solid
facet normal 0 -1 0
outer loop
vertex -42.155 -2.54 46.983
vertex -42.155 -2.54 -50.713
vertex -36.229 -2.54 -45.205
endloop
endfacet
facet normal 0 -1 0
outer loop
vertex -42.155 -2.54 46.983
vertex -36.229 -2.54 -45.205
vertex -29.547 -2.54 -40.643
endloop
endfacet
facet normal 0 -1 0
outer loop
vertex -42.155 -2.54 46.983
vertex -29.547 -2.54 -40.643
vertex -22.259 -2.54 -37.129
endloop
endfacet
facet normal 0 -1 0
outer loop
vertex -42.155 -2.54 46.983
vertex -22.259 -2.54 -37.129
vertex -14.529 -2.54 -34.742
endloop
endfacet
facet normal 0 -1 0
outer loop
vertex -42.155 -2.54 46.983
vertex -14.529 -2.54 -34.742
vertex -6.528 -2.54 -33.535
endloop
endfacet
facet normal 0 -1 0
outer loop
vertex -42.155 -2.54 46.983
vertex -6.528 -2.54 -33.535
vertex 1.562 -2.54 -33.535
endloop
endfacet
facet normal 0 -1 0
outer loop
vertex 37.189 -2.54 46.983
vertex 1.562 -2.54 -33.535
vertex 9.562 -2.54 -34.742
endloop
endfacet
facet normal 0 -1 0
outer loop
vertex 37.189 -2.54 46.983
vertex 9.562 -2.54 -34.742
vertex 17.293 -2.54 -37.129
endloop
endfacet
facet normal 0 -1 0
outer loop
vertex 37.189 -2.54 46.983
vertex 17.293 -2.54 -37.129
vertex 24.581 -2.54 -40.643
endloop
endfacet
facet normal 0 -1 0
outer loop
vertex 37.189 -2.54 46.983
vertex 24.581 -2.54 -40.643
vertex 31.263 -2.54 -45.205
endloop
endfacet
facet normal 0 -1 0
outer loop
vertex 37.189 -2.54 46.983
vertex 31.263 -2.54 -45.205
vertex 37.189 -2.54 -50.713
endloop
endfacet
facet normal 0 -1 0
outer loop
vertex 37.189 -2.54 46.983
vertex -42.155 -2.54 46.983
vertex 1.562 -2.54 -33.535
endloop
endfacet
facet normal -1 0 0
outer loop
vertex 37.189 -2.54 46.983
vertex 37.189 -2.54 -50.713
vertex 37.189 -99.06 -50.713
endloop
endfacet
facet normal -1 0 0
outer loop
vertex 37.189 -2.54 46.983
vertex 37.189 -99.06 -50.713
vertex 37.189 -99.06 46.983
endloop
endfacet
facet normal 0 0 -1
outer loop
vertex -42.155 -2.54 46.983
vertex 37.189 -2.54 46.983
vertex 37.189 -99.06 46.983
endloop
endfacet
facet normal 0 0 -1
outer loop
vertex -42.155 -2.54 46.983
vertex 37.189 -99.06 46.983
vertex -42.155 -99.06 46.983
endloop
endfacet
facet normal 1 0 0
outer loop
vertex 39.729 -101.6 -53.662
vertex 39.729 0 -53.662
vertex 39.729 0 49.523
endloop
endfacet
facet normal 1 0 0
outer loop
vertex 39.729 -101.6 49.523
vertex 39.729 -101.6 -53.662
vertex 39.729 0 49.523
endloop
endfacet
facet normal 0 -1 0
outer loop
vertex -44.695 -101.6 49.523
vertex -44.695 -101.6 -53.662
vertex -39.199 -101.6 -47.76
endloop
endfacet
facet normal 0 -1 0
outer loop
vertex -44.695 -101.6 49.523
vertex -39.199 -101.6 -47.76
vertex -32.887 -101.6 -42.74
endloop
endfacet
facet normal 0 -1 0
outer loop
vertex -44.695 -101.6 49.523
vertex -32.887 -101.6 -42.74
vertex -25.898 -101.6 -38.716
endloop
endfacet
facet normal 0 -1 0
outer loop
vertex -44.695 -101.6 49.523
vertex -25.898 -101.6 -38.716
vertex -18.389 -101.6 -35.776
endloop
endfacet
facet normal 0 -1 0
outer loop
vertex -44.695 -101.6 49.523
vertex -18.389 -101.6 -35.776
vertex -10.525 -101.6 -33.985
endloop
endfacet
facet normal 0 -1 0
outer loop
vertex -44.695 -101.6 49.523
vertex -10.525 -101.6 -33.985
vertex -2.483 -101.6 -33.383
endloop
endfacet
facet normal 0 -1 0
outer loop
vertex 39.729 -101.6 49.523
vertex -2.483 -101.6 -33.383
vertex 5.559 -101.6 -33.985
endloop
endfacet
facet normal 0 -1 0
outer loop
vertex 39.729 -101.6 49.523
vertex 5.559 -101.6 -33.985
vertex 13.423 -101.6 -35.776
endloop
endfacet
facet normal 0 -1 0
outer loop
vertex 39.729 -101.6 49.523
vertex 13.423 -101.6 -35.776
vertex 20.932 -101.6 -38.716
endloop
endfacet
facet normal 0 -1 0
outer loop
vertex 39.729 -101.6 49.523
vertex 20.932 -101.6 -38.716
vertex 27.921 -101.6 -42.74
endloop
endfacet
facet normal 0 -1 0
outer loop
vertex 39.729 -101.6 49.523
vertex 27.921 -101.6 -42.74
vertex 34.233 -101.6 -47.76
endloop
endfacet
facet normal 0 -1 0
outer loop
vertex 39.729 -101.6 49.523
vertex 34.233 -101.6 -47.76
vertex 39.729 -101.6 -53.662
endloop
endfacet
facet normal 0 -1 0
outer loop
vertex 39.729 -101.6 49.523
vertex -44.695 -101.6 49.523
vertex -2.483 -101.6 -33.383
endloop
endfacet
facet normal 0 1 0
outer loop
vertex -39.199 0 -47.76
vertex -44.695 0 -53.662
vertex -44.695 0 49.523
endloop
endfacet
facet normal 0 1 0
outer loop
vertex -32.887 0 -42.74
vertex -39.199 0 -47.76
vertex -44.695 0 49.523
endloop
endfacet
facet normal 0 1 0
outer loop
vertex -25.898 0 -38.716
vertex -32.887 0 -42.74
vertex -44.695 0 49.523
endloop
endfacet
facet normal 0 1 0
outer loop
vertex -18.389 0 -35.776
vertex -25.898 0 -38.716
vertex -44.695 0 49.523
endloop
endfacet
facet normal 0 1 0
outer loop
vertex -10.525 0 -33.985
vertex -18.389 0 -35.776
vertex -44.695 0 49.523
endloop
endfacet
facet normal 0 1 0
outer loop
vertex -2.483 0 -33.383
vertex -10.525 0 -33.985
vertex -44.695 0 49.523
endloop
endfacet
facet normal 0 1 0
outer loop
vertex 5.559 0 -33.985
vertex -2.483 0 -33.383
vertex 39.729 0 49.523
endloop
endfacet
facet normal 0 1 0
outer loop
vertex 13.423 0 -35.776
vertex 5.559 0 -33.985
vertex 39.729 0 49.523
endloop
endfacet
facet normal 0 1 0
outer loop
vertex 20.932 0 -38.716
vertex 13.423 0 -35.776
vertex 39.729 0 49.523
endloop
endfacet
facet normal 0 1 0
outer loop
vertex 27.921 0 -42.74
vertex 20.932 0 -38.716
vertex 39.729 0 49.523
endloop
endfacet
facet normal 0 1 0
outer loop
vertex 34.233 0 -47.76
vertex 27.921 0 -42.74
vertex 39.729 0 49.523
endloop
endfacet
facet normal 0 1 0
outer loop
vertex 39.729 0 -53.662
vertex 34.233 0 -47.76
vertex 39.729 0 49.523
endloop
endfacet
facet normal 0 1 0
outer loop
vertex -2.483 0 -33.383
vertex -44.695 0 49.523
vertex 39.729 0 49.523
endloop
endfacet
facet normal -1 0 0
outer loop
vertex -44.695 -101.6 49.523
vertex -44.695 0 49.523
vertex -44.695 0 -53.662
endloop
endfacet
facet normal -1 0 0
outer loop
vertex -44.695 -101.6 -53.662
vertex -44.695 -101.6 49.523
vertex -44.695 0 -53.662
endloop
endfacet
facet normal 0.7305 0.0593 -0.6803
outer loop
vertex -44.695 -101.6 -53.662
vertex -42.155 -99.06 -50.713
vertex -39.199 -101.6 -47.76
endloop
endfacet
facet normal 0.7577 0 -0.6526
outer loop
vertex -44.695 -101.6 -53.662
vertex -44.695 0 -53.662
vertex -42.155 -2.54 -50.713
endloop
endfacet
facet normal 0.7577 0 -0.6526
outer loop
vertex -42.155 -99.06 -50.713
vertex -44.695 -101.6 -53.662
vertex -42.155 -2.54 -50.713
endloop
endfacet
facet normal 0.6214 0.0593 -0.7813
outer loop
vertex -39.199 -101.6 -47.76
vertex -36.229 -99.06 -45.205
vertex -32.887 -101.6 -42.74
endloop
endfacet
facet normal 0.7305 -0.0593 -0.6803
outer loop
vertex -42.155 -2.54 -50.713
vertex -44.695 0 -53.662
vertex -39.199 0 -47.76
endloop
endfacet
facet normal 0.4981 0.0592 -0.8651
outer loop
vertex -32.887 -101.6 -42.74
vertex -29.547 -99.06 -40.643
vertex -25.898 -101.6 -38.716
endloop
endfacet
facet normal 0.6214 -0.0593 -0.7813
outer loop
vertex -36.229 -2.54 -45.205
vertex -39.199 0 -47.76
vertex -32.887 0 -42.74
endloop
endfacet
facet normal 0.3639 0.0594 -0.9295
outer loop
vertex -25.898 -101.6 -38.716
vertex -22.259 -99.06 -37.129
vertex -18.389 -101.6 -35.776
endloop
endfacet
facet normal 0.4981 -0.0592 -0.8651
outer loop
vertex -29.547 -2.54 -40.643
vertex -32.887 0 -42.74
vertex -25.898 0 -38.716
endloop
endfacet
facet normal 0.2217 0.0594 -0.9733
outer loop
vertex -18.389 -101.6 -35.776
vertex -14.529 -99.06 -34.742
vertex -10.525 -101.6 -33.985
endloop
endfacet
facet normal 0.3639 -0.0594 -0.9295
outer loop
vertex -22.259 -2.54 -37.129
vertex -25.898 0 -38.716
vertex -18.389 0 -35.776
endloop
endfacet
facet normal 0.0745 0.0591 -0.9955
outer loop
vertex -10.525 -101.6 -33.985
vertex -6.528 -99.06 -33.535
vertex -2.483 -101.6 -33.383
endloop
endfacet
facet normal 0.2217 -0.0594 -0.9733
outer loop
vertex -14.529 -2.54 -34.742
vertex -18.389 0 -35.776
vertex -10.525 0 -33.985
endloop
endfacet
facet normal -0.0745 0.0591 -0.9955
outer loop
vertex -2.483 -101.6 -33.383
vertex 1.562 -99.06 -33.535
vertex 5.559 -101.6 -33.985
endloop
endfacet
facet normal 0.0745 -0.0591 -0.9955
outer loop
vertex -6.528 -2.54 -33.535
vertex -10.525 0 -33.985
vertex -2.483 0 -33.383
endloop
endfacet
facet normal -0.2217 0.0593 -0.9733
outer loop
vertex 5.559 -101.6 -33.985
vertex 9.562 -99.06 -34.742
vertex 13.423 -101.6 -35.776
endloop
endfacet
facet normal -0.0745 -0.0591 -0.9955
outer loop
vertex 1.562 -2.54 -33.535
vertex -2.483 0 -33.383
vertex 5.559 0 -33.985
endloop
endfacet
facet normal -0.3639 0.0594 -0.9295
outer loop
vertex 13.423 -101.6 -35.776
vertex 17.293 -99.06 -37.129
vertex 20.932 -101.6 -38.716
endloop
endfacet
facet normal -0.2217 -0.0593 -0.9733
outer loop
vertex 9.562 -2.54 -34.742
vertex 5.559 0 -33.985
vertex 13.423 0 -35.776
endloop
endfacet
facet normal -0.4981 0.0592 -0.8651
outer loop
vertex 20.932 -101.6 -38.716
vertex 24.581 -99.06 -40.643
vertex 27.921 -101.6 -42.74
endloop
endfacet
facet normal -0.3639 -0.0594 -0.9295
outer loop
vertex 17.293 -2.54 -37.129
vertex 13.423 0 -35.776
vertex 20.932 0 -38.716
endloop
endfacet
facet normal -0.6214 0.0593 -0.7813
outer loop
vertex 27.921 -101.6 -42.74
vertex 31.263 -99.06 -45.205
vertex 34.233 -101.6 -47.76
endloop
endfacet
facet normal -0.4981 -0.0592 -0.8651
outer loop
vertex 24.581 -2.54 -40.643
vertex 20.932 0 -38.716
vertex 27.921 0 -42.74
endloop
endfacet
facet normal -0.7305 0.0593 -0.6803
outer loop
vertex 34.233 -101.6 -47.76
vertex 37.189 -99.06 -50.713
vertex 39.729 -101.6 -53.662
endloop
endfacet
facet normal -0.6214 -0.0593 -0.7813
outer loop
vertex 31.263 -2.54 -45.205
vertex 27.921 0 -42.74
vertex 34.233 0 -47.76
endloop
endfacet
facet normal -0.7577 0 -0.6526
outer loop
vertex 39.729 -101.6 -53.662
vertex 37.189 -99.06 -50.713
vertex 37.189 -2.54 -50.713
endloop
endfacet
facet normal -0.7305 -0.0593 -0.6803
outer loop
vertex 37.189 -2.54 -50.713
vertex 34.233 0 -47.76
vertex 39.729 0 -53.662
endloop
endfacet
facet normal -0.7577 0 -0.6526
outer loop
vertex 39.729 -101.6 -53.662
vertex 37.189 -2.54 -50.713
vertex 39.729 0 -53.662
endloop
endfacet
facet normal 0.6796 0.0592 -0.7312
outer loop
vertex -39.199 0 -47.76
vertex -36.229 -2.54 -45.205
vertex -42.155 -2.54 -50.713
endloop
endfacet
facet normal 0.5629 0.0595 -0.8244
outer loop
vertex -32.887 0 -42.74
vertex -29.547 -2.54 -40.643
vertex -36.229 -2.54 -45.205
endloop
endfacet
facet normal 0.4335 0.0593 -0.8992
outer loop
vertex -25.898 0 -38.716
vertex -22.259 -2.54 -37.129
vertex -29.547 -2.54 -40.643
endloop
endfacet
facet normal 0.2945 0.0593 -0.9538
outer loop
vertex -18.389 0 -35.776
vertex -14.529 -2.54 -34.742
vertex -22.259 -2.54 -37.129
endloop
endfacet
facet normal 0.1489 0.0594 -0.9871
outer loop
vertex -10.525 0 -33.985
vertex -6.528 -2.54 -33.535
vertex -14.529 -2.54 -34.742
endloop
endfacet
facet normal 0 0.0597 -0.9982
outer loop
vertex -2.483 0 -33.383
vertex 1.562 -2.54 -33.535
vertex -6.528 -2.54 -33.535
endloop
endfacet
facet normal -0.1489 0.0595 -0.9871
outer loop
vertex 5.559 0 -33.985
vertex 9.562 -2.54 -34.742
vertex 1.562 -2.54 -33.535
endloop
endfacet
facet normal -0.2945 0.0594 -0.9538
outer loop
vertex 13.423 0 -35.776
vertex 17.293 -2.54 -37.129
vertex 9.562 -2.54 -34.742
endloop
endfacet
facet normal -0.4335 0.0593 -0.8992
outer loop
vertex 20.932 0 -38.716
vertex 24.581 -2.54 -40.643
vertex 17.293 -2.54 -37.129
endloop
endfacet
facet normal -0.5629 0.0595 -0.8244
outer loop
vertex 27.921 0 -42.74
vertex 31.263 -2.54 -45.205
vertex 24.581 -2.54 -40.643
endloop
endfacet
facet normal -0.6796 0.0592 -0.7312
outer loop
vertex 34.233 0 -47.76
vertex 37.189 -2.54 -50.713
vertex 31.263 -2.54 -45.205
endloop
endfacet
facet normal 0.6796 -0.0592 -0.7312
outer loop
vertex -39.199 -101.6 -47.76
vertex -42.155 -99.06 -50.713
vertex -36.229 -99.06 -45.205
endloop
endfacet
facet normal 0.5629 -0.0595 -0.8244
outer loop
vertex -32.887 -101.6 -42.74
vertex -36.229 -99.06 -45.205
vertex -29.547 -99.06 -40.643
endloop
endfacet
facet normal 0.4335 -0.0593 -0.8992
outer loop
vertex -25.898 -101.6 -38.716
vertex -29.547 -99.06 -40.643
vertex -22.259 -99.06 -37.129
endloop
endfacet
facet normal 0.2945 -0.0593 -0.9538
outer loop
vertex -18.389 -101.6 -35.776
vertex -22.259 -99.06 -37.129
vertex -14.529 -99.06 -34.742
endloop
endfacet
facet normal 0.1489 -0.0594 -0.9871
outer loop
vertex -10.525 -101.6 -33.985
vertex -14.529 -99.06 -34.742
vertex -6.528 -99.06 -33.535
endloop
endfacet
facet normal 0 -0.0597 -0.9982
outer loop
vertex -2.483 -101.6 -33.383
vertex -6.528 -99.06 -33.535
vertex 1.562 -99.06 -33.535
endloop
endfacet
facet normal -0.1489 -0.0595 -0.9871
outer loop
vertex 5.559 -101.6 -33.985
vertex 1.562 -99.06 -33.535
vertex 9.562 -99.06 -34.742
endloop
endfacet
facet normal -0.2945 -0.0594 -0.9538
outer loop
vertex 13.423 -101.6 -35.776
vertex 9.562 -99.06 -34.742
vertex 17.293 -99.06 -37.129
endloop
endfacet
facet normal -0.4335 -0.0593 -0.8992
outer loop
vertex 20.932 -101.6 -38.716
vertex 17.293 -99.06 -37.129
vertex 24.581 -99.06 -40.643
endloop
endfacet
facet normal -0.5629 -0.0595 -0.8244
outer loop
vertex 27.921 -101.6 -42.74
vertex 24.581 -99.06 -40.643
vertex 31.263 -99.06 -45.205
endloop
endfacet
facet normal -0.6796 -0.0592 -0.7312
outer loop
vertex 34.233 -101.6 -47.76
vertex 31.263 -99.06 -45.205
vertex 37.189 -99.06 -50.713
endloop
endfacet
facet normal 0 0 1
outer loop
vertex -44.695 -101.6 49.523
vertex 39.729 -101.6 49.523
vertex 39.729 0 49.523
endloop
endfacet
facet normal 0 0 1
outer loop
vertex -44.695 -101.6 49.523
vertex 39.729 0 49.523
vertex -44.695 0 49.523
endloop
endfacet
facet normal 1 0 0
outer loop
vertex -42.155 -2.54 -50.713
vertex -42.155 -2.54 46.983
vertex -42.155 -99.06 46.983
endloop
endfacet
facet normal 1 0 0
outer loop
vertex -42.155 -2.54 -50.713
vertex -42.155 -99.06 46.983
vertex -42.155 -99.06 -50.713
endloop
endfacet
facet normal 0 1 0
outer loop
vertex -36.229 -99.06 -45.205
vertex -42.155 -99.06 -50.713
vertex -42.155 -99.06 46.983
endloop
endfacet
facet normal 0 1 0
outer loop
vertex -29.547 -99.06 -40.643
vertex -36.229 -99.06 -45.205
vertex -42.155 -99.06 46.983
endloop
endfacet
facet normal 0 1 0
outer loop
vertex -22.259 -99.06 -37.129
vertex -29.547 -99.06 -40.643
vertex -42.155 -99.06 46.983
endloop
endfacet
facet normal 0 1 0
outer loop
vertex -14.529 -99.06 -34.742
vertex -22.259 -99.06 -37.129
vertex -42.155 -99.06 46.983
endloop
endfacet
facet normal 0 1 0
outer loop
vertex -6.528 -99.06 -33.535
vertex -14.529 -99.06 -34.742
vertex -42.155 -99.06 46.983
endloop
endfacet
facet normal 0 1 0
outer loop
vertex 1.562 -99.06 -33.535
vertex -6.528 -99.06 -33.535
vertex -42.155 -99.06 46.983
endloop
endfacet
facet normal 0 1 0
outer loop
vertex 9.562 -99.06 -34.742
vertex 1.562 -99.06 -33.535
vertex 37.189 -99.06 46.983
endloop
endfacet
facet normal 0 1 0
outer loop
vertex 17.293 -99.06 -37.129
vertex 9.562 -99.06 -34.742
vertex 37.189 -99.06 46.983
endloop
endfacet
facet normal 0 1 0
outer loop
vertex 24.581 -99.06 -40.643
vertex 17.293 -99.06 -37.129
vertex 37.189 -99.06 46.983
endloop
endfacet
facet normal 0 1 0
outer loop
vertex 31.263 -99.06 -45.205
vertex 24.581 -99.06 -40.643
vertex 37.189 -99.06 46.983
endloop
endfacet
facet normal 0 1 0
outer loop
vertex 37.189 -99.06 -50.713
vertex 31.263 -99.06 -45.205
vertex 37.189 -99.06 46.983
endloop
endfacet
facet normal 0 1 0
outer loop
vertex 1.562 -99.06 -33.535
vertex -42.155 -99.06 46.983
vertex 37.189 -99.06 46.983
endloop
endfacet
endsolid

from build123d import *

# Parameters (mm, degrees)
F1_DEPTH = 101.6
F2_T     = -2.54


with BuildPart() as f1:
    # F0 (on Front) → F1 (new body)
    with BuildSketch(Plane.XZ):
        with BuildLine():
            Line((39.729103, 49.523432), (-44.695243, 49.523432))
            Line((-44.695243, 49.523432), (-44.695243, -53.661879))
            ThreePointArc((-44.695243, -53.661879), (-2.48307, -33.383303), (39.729103, -53.661879))
            Line((39.729103, -53.661879), (39.729103, 49.523432))
        make_face()
    extrude(amount=F1_DEPTH)

    # F2
    f2_openings = [f1.faces().sort_by_distance(p)[0] for p in [
        (-2.48307, -50.8, -33.383303),
    ]]
    offset(amount=F2_T, openings=f2_openings)


solid = f1.part
